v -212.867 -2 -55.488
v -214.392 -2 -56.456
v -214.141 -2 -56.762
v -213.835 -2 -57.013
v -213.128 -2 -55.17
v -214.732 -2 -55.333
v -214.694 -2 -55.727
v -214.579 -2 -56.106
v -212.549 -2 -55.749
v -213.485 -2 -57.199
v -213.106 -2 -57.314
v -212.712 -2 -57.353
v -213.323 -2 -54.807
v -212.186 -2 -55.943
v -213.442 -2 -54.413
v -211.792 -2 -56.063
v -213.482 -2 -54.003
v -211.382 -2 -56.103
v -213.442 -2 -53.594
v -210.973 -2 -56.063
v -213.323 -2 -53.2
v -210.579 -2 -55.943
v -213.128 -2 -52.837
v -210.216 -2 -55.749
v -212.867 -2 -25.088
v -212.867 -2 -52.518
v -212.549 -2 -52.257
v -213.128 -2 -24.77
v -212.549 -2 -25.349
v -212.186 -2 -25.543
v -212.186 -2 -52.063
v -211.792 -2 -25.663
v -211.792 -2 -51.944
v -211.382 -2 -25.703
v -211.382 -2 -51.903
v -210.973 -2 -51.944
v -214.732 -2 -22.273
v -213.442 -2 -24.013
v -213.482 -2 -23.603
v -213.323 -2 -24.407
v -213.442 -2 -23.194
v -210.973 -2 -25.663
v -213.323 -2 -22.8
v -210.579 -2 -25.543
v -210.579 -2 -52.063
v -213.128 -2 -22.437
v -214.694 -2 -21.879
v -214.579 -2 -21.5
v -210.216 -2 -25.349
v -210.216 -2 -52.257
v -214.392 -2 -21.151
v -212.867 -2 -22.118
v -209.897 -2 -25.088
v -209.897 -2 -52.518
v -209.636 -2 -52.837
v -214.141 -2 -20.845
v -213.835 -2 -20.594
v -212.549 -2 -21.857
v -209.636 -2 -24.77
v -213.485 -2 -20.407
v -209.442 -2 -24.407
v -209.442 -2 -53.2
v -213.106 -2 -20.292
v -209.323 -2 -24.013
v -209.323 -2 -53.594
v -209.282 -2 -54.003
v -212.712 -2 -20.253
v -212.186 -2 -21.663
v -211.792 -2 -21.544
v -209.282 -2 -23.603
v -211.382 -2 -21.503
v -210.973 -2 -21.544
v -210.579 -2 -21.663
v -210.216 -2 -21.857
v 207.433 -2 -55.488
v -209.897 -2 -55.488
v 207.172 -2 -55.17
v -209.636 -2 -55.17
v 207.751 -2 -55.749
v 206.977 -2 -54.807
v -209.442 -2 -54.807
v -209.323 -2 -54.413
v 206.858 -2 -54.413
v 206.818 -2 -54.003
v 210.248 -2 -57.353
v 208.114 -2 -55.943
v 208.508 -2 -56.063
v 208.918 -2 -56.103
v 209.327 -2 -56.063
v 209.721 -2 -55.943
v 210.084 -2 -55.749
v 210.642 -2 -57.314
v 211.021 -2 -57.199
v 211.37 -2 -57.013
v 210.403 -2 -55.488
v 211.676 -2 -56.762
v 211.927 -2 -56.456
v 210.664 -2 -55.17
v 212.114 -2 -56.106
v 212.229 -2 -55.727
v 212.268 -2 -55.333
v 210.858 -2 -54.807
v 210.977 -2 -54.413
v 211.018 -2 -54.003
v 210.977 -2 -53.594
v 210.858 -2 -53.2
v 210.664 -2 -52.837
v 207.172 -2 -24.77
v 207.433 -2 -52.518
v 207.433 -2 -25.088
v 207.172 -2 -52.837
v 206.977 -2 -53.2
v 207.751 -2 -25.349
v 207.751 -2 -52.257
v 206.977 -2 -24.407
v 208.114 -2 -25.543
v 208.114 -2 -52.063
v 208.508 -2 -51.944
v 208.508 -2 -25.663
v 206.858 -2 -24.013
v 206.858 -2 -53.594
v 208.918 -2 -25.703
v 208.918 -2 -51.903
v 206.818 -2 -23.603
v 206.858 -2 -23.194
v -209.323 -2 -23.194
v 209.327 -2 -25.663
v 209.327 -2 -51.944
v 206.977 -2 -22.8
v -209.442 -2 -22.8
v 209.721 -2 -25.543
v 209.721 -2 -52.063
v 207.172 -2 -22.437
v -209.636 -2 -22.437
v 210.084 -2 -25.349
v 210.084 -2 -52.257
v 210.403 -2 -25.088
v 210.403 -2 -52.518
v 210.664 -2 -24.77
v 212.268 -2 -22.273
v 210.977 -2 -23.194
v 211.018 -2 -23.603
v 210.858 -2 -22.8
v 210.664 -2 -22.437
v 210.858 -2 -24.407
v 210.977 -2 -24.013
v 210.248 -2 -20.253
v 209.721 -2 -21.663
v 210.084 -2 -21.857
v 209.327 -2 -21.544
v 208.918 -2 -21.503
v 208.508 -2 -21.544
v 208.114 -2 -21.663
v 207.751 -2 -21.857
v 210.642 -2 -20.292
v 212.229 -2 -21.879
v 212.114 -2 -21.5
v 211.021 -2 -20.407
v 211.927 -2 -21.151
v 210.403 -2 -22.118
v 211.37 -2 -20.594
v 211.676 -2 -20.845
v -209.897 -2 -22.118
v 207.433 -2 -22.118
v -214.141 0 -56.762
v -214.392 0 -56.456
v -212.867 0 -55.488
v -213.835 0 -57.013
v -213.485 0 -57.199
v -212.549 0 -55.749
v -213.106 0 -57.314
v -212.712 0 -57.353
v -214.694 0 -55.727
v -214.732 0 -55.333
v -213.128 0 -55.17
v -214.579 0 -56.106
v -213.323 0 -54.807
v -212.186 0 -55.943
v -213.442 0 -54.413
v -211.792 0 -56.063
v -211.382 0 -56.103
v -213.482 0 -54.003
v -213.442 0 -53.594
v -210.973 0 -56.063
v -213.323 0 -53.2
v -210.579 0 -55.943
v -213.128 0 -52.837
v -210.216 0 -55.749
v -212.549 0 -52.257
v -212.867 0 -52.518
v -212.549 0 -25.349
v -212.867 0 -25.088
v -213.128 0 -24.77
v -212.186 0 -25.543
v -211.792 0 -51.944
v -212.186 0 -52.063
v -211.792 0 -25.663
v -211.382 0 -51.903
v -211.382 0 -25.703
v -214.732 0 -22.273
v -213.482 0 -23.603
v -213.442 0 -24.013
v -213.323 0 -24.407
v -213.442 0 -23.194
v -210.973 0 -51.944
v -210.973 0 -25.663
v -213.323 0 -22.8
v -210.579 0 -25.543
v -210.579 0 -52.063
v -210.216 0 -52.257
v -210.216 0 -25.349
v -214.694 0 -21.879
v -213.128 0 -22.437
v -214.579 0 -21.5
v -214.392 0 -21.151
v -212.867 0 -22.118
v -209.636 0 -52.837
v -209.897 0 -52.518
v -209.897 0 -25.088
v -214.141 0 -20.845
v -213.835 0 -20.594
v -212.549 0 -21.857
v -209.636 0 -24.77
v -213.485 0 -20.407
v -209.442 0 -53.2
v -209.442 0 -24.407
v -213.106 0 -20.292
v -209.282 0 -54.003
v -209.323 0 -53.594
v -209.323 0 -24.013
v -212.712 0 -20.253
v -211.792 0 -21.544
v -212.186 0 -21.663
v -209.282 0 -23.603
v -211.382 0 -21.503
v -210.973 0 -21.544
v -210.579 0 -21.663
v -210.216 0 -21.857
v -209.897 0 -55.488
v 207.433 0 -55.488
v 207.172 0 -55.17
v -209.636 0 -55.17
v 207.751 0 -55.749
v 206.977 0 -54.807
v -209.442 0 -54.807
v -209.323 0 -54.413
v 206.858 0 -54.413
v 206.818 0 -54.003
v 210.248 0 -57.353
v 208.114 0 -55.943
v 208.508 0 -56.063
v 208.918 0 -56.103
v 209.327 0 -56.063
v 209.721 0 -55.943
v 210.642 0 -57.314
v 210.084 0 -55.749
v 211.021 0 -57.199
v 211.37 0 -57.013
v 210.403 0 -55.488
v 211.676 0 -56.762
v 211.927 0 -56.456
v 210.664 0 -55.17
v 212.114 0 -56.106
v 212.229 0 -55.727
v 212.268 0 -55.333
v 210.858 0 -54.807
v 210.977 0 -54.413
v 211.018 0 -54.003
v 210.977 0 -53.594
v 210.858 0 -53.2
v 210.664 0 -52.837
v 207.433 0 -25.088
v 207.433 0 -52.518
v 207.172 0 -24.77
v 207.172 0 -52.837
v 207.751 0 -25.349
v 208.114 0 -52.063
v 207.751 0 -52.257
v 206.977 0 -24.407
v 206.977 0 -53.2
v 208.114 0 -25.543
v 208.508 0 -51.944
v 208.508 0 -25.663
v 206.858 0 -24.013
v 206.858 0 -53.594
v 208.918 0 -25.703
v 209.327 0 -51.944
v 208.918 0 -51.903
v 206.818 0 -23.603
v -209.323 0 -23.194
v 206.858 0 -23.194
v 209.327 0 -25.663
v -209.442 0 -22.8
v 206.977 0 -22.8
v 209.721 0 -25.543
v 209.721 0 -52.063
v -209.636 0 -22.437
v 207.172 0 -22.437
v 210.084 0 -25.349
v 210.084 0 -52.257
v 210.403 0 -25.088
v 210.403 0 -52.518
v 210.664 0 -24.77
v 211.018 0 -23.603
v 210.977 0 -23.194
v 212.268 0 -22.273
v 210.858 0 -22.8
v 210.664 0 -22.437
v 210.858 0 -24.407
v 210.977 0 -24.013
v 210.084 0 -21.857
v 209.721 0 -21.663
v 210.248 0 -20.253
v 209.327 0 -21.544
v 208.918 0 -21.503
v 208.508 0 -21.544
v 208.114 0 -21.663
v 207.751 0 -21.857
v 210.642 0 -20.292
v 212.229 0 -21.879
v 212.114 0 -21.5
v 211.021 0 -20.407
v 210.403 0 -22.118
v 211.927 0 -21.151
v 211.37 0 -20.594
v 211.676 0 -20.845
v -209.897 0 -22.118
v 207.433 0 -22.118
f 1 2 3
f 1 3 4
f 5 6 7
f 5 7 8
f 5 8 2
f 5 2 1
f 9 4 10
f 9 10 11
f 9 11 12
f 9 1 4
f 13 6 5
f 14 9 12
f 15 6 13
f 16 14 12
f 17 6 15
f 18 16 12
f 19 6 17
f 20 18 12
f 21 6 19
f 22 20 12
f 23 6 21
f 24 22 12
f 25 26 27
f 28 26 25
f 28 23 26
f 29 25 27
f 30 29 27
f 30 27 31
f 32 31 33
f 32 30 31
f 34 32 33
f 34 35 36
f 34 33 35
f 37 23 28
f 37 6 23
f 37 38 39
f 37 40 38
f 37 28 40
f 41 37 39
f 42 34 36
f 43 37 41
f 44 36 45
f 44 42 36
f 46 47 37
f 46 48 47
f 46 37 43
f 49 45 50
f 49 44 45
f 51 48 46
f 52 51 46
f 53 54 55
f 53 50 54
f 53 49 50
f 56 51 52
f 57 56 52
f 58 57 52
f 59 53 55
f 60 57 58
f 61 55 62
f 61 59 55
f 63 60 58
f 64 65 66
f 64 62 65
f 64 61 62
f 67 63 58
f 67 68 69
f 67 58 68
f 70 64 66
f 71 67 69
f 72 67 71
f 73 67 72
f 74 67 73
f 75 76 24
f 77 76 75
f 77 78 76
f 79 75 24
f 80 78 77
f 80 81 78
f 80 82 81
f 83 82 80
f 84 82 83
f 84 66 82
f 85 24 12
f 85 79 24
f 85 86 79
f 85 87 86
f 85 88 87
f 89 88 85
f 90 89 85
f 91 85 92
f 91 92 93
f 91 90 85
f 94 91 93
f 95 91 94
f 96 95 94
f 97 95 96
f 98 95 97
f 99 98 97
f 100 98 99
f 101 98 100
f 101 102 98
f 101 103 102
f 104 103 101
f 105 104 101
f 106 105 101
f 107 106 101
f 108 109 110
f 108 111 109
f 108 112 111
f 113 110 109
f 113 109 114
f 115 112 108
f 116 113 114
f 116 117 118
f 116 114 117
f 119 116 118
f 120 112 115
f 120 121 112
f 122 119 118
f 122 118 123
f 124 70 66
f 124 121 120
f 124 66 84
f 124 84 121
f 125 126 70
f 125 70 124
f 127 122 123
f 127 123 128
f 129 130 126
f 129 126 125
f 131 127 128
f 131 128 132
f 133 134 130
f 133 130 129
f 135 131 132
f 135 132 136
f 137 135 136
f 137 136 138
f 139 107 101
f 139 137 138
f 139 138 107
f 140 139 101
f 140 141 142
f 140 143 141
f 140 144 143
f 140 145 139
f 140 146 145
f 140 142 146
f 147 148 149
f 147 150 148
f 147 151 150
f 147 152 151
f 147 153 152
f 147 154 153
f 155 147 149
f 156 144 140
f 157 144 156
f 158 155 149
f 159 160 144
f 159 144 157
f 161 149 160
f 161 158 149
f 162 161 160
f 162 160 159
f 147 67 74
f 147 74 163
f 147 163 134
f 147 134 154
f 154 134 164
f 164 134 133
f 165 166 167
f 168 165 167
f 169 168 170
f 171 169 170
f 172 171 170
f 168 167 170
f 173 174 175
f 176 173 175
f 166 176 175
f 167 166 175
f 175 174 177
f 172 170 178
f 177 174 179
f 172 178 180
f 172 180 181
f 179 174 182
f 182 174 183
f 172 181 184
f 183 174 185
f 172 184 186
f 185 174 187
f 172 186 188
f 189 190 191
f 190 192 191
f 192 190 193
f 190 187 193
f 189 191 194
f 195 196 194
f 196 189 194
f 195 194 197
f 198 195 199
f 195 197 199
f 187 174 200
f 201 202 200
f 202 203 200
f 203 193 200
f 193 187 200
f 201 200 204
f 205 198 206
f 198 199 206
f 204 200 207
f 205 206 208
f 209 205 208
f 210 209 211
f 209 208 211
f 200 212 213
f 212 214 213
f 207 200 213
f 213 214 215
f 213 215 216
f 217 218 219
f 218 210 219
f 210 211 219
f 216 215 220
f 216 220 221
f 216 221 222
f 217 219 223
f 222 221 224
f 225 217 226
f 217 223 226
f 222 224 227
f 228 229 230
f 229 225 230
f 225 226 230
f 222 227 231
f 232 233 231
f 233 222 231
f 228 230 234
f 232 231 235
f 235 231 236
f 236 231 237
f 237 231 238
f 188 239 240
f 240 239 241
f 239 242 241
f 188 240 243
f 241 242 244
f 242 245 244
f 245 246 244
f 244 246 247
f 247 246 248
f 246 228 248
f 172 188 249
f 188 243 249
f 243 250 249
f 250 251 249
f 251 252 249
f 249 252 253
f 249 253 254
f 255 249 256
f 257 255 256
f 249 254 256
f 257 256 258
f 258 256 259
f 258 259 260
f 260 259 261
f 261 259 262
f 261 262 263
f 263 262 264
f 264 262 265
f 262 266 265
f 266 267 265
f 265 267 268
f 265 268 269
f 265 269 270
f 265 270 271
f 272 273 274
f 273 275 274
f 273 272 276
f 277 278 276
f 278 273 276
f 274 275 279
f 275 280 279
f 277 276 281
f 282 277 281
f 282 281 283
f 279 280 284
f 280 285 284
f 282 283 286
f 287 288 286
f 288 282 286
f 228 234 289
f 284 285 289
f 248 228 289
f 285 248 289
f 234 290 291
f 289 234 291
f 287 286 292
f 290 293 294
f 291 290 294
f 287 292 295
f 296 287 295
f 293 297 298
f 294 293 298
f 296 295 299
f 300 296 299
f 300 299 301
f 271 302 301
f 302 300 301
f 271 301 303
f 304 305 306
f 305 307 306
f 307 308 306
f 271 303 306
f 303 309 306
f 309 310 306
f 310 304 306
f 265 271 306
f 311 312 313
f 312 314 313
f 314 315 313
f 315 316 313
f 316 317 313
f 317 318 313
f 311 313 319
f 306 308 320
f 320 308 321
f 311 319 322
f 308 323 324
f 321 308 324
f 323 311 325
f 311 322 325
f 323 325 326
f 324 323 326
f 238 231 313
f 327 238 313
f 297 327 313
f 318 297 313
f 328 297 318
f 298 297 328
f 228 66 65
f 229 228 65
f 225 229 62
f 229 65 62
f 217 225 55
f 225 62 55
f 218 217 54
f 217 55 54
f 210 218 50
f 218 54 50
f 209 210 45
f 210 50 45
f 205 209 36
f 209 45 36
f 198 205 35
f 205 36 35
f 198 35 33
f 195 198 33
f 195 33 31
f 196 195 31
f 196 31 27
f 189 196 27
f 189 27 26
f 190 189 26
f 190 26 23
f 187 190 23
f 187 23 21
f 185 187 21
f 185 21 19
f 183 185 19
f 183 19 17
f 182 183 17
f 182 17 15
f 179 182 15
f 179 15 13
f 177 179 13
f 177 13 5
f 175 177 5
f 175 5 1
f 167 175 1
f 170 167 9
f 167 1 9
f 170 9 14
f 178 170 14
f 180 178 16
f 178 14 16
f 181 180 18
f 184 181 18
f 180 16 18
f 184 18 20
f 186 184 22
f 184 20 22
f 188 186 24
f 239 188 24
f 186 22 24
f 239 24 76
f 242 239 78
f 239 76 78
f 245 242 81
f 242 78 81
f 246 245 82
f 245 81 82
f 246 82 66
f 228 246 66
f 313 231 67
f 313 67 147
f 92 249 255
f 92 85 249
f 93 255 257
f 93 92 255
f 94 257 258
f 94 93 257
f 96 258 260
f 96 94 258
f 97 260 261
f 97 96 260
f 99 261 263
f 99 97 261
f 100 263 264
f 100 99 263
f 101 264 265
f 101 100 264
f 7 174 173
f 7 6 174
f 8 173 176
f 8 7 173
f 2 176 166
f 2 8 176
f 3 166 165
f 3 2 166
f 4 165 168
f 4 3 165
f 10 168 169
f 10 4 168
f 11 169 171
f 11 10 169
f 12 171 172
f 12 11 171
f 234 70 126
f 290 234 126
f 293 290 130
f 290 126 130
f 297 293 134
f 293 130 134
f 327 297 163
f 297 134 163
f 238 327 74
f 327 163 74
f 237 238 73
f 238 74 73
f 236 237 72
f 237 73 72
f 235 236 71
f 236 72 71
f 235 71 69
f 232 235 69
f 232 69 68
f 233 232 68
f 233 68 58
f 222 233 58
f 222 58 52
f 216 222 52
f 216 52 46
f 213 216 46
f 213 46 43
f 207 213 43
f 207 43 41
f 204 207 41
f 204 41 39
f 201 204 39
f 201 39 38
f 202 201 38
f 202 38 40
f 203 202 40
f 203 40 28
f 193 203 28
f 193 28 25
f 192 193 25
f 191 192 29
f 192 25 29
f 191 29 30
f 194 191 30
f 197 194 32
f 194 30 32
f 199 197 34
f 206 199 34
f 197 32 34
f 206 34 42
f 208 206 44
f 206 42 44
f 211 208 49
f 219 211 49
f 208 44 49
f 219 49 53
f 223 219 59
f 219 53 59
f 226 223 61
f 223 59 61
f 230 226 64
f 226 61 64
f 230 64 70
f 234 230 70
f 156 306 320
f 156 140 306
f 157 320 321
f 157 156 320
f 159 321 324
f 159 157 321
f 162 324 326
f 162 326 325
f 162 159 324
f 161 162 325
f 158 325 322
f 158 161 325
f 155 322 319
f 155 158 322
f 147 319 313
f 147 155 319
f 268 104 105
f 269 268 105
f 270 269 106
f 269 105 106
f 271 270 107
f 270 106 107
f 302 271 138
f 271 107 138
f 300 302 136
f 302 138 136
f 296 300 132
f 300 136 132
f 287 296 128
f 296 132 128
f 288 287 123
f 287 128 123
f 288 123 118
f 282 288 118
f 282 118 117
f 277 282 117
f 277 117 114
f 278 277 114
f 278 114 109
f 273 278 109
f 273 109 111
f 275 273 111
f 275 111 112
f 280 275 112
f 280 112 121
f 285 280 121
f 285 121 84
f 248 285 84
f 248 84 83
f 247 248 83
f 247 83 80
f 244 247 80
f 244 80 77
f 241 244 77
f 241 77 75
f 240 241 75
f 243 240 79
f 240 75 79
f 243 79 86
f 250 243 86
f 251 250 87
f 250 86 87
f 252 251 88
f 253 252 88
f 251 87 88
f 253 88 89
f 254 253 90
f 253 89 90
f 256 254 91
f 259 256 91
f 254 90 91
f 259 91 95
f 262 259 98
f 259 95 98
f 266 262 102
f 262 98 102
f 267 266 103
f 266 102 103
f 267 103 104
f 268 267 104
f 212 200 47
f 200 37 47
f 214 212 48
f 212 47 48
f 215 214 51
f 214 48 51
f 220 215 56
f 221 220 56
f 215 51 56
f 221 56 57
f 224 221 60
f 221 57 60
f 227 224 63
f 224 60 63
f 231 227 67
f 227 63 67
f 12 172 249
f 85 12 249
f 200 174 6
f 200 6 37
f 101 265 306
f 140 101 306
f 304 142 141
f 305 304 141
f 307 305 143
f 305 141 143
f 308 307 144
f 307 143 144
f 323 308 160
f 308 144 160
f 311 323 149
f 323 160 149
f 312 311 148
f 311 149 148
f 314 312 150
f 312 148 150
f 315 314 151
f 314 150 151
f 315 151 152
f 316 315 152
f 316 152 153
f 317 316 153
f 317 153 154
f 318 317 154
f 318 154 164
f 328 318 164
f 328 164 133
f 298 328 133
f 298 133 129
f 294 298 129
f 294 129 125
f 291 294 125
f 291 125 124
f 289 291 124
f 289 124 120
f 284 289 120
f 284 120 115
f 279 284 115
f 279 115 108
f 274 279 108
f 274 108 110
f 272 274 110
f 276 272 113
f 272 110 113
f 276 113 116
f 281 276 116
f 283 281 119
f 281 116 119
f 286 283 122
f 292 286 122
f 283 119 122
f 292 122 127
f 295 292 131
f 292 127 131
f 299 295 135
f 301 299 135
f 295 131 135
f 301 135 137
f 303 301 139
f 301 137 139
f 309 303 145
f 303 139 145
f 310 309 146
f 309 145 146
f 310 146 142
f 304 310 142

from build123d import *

# Parameters (mm, degrees)
F0_W     = 427
F0_H     = 37.1
F1_DEPTH = 2
F2_R     = 2.02
F3_R     = 2.1
F6_DEPTH = 25
F4_R     = 2.1
F5_R     = 2.1
F7_DEPTH = 25


with BuildPart() as f1:
    # F0 (on Front) → F1 (new body)
    with BuildSketch(Plane.XZ):
        with Locations((-1.23238, -38.803261)):
            Rectangle(F0_W, F0_H)
    extrude(amount=F1_DEPTH)

    # F2
    f2_edges = [f1.edges().sort_by_distance(p)[0] for p in [
        (-214.73238, -1, -20.253261),
        (-214.73238, -1, -57.353261),
        (212.26762, -1, -57.353261),
        (212.26762, -1, -20.253261),
    ]]
    fillet(f2_edges, radius=F2_R)

    # F3 (on face) → F6 (cut)
    with BuildSketch(Plane.XZ.offset(2)):
        with Locations((-211.38238, -23.603261)):
            Circle(F3_R)
    extrude(amount=-F6_DEPTH, mode=Mode.SUBTRACT)

    # F4 (on face) + F5 (on face) → F7 (cut)
    with BuildSketch(Plane.XZ.offset(2)):
        with Locations((-211.38238, -54.003261)):
            Circle(F4_R)
    with BuildSketch(Plane.XZ.offset(2)):
        with Locations((208.91762, -23.603261)):
            Circle(F5_R)
        with Locations((208.91762, -54.003261)):
            Circle(F5_R)
    extrude(amount=-F7_DEPTH, mode=Mode.SUBTRACT)


solid = f1.part
